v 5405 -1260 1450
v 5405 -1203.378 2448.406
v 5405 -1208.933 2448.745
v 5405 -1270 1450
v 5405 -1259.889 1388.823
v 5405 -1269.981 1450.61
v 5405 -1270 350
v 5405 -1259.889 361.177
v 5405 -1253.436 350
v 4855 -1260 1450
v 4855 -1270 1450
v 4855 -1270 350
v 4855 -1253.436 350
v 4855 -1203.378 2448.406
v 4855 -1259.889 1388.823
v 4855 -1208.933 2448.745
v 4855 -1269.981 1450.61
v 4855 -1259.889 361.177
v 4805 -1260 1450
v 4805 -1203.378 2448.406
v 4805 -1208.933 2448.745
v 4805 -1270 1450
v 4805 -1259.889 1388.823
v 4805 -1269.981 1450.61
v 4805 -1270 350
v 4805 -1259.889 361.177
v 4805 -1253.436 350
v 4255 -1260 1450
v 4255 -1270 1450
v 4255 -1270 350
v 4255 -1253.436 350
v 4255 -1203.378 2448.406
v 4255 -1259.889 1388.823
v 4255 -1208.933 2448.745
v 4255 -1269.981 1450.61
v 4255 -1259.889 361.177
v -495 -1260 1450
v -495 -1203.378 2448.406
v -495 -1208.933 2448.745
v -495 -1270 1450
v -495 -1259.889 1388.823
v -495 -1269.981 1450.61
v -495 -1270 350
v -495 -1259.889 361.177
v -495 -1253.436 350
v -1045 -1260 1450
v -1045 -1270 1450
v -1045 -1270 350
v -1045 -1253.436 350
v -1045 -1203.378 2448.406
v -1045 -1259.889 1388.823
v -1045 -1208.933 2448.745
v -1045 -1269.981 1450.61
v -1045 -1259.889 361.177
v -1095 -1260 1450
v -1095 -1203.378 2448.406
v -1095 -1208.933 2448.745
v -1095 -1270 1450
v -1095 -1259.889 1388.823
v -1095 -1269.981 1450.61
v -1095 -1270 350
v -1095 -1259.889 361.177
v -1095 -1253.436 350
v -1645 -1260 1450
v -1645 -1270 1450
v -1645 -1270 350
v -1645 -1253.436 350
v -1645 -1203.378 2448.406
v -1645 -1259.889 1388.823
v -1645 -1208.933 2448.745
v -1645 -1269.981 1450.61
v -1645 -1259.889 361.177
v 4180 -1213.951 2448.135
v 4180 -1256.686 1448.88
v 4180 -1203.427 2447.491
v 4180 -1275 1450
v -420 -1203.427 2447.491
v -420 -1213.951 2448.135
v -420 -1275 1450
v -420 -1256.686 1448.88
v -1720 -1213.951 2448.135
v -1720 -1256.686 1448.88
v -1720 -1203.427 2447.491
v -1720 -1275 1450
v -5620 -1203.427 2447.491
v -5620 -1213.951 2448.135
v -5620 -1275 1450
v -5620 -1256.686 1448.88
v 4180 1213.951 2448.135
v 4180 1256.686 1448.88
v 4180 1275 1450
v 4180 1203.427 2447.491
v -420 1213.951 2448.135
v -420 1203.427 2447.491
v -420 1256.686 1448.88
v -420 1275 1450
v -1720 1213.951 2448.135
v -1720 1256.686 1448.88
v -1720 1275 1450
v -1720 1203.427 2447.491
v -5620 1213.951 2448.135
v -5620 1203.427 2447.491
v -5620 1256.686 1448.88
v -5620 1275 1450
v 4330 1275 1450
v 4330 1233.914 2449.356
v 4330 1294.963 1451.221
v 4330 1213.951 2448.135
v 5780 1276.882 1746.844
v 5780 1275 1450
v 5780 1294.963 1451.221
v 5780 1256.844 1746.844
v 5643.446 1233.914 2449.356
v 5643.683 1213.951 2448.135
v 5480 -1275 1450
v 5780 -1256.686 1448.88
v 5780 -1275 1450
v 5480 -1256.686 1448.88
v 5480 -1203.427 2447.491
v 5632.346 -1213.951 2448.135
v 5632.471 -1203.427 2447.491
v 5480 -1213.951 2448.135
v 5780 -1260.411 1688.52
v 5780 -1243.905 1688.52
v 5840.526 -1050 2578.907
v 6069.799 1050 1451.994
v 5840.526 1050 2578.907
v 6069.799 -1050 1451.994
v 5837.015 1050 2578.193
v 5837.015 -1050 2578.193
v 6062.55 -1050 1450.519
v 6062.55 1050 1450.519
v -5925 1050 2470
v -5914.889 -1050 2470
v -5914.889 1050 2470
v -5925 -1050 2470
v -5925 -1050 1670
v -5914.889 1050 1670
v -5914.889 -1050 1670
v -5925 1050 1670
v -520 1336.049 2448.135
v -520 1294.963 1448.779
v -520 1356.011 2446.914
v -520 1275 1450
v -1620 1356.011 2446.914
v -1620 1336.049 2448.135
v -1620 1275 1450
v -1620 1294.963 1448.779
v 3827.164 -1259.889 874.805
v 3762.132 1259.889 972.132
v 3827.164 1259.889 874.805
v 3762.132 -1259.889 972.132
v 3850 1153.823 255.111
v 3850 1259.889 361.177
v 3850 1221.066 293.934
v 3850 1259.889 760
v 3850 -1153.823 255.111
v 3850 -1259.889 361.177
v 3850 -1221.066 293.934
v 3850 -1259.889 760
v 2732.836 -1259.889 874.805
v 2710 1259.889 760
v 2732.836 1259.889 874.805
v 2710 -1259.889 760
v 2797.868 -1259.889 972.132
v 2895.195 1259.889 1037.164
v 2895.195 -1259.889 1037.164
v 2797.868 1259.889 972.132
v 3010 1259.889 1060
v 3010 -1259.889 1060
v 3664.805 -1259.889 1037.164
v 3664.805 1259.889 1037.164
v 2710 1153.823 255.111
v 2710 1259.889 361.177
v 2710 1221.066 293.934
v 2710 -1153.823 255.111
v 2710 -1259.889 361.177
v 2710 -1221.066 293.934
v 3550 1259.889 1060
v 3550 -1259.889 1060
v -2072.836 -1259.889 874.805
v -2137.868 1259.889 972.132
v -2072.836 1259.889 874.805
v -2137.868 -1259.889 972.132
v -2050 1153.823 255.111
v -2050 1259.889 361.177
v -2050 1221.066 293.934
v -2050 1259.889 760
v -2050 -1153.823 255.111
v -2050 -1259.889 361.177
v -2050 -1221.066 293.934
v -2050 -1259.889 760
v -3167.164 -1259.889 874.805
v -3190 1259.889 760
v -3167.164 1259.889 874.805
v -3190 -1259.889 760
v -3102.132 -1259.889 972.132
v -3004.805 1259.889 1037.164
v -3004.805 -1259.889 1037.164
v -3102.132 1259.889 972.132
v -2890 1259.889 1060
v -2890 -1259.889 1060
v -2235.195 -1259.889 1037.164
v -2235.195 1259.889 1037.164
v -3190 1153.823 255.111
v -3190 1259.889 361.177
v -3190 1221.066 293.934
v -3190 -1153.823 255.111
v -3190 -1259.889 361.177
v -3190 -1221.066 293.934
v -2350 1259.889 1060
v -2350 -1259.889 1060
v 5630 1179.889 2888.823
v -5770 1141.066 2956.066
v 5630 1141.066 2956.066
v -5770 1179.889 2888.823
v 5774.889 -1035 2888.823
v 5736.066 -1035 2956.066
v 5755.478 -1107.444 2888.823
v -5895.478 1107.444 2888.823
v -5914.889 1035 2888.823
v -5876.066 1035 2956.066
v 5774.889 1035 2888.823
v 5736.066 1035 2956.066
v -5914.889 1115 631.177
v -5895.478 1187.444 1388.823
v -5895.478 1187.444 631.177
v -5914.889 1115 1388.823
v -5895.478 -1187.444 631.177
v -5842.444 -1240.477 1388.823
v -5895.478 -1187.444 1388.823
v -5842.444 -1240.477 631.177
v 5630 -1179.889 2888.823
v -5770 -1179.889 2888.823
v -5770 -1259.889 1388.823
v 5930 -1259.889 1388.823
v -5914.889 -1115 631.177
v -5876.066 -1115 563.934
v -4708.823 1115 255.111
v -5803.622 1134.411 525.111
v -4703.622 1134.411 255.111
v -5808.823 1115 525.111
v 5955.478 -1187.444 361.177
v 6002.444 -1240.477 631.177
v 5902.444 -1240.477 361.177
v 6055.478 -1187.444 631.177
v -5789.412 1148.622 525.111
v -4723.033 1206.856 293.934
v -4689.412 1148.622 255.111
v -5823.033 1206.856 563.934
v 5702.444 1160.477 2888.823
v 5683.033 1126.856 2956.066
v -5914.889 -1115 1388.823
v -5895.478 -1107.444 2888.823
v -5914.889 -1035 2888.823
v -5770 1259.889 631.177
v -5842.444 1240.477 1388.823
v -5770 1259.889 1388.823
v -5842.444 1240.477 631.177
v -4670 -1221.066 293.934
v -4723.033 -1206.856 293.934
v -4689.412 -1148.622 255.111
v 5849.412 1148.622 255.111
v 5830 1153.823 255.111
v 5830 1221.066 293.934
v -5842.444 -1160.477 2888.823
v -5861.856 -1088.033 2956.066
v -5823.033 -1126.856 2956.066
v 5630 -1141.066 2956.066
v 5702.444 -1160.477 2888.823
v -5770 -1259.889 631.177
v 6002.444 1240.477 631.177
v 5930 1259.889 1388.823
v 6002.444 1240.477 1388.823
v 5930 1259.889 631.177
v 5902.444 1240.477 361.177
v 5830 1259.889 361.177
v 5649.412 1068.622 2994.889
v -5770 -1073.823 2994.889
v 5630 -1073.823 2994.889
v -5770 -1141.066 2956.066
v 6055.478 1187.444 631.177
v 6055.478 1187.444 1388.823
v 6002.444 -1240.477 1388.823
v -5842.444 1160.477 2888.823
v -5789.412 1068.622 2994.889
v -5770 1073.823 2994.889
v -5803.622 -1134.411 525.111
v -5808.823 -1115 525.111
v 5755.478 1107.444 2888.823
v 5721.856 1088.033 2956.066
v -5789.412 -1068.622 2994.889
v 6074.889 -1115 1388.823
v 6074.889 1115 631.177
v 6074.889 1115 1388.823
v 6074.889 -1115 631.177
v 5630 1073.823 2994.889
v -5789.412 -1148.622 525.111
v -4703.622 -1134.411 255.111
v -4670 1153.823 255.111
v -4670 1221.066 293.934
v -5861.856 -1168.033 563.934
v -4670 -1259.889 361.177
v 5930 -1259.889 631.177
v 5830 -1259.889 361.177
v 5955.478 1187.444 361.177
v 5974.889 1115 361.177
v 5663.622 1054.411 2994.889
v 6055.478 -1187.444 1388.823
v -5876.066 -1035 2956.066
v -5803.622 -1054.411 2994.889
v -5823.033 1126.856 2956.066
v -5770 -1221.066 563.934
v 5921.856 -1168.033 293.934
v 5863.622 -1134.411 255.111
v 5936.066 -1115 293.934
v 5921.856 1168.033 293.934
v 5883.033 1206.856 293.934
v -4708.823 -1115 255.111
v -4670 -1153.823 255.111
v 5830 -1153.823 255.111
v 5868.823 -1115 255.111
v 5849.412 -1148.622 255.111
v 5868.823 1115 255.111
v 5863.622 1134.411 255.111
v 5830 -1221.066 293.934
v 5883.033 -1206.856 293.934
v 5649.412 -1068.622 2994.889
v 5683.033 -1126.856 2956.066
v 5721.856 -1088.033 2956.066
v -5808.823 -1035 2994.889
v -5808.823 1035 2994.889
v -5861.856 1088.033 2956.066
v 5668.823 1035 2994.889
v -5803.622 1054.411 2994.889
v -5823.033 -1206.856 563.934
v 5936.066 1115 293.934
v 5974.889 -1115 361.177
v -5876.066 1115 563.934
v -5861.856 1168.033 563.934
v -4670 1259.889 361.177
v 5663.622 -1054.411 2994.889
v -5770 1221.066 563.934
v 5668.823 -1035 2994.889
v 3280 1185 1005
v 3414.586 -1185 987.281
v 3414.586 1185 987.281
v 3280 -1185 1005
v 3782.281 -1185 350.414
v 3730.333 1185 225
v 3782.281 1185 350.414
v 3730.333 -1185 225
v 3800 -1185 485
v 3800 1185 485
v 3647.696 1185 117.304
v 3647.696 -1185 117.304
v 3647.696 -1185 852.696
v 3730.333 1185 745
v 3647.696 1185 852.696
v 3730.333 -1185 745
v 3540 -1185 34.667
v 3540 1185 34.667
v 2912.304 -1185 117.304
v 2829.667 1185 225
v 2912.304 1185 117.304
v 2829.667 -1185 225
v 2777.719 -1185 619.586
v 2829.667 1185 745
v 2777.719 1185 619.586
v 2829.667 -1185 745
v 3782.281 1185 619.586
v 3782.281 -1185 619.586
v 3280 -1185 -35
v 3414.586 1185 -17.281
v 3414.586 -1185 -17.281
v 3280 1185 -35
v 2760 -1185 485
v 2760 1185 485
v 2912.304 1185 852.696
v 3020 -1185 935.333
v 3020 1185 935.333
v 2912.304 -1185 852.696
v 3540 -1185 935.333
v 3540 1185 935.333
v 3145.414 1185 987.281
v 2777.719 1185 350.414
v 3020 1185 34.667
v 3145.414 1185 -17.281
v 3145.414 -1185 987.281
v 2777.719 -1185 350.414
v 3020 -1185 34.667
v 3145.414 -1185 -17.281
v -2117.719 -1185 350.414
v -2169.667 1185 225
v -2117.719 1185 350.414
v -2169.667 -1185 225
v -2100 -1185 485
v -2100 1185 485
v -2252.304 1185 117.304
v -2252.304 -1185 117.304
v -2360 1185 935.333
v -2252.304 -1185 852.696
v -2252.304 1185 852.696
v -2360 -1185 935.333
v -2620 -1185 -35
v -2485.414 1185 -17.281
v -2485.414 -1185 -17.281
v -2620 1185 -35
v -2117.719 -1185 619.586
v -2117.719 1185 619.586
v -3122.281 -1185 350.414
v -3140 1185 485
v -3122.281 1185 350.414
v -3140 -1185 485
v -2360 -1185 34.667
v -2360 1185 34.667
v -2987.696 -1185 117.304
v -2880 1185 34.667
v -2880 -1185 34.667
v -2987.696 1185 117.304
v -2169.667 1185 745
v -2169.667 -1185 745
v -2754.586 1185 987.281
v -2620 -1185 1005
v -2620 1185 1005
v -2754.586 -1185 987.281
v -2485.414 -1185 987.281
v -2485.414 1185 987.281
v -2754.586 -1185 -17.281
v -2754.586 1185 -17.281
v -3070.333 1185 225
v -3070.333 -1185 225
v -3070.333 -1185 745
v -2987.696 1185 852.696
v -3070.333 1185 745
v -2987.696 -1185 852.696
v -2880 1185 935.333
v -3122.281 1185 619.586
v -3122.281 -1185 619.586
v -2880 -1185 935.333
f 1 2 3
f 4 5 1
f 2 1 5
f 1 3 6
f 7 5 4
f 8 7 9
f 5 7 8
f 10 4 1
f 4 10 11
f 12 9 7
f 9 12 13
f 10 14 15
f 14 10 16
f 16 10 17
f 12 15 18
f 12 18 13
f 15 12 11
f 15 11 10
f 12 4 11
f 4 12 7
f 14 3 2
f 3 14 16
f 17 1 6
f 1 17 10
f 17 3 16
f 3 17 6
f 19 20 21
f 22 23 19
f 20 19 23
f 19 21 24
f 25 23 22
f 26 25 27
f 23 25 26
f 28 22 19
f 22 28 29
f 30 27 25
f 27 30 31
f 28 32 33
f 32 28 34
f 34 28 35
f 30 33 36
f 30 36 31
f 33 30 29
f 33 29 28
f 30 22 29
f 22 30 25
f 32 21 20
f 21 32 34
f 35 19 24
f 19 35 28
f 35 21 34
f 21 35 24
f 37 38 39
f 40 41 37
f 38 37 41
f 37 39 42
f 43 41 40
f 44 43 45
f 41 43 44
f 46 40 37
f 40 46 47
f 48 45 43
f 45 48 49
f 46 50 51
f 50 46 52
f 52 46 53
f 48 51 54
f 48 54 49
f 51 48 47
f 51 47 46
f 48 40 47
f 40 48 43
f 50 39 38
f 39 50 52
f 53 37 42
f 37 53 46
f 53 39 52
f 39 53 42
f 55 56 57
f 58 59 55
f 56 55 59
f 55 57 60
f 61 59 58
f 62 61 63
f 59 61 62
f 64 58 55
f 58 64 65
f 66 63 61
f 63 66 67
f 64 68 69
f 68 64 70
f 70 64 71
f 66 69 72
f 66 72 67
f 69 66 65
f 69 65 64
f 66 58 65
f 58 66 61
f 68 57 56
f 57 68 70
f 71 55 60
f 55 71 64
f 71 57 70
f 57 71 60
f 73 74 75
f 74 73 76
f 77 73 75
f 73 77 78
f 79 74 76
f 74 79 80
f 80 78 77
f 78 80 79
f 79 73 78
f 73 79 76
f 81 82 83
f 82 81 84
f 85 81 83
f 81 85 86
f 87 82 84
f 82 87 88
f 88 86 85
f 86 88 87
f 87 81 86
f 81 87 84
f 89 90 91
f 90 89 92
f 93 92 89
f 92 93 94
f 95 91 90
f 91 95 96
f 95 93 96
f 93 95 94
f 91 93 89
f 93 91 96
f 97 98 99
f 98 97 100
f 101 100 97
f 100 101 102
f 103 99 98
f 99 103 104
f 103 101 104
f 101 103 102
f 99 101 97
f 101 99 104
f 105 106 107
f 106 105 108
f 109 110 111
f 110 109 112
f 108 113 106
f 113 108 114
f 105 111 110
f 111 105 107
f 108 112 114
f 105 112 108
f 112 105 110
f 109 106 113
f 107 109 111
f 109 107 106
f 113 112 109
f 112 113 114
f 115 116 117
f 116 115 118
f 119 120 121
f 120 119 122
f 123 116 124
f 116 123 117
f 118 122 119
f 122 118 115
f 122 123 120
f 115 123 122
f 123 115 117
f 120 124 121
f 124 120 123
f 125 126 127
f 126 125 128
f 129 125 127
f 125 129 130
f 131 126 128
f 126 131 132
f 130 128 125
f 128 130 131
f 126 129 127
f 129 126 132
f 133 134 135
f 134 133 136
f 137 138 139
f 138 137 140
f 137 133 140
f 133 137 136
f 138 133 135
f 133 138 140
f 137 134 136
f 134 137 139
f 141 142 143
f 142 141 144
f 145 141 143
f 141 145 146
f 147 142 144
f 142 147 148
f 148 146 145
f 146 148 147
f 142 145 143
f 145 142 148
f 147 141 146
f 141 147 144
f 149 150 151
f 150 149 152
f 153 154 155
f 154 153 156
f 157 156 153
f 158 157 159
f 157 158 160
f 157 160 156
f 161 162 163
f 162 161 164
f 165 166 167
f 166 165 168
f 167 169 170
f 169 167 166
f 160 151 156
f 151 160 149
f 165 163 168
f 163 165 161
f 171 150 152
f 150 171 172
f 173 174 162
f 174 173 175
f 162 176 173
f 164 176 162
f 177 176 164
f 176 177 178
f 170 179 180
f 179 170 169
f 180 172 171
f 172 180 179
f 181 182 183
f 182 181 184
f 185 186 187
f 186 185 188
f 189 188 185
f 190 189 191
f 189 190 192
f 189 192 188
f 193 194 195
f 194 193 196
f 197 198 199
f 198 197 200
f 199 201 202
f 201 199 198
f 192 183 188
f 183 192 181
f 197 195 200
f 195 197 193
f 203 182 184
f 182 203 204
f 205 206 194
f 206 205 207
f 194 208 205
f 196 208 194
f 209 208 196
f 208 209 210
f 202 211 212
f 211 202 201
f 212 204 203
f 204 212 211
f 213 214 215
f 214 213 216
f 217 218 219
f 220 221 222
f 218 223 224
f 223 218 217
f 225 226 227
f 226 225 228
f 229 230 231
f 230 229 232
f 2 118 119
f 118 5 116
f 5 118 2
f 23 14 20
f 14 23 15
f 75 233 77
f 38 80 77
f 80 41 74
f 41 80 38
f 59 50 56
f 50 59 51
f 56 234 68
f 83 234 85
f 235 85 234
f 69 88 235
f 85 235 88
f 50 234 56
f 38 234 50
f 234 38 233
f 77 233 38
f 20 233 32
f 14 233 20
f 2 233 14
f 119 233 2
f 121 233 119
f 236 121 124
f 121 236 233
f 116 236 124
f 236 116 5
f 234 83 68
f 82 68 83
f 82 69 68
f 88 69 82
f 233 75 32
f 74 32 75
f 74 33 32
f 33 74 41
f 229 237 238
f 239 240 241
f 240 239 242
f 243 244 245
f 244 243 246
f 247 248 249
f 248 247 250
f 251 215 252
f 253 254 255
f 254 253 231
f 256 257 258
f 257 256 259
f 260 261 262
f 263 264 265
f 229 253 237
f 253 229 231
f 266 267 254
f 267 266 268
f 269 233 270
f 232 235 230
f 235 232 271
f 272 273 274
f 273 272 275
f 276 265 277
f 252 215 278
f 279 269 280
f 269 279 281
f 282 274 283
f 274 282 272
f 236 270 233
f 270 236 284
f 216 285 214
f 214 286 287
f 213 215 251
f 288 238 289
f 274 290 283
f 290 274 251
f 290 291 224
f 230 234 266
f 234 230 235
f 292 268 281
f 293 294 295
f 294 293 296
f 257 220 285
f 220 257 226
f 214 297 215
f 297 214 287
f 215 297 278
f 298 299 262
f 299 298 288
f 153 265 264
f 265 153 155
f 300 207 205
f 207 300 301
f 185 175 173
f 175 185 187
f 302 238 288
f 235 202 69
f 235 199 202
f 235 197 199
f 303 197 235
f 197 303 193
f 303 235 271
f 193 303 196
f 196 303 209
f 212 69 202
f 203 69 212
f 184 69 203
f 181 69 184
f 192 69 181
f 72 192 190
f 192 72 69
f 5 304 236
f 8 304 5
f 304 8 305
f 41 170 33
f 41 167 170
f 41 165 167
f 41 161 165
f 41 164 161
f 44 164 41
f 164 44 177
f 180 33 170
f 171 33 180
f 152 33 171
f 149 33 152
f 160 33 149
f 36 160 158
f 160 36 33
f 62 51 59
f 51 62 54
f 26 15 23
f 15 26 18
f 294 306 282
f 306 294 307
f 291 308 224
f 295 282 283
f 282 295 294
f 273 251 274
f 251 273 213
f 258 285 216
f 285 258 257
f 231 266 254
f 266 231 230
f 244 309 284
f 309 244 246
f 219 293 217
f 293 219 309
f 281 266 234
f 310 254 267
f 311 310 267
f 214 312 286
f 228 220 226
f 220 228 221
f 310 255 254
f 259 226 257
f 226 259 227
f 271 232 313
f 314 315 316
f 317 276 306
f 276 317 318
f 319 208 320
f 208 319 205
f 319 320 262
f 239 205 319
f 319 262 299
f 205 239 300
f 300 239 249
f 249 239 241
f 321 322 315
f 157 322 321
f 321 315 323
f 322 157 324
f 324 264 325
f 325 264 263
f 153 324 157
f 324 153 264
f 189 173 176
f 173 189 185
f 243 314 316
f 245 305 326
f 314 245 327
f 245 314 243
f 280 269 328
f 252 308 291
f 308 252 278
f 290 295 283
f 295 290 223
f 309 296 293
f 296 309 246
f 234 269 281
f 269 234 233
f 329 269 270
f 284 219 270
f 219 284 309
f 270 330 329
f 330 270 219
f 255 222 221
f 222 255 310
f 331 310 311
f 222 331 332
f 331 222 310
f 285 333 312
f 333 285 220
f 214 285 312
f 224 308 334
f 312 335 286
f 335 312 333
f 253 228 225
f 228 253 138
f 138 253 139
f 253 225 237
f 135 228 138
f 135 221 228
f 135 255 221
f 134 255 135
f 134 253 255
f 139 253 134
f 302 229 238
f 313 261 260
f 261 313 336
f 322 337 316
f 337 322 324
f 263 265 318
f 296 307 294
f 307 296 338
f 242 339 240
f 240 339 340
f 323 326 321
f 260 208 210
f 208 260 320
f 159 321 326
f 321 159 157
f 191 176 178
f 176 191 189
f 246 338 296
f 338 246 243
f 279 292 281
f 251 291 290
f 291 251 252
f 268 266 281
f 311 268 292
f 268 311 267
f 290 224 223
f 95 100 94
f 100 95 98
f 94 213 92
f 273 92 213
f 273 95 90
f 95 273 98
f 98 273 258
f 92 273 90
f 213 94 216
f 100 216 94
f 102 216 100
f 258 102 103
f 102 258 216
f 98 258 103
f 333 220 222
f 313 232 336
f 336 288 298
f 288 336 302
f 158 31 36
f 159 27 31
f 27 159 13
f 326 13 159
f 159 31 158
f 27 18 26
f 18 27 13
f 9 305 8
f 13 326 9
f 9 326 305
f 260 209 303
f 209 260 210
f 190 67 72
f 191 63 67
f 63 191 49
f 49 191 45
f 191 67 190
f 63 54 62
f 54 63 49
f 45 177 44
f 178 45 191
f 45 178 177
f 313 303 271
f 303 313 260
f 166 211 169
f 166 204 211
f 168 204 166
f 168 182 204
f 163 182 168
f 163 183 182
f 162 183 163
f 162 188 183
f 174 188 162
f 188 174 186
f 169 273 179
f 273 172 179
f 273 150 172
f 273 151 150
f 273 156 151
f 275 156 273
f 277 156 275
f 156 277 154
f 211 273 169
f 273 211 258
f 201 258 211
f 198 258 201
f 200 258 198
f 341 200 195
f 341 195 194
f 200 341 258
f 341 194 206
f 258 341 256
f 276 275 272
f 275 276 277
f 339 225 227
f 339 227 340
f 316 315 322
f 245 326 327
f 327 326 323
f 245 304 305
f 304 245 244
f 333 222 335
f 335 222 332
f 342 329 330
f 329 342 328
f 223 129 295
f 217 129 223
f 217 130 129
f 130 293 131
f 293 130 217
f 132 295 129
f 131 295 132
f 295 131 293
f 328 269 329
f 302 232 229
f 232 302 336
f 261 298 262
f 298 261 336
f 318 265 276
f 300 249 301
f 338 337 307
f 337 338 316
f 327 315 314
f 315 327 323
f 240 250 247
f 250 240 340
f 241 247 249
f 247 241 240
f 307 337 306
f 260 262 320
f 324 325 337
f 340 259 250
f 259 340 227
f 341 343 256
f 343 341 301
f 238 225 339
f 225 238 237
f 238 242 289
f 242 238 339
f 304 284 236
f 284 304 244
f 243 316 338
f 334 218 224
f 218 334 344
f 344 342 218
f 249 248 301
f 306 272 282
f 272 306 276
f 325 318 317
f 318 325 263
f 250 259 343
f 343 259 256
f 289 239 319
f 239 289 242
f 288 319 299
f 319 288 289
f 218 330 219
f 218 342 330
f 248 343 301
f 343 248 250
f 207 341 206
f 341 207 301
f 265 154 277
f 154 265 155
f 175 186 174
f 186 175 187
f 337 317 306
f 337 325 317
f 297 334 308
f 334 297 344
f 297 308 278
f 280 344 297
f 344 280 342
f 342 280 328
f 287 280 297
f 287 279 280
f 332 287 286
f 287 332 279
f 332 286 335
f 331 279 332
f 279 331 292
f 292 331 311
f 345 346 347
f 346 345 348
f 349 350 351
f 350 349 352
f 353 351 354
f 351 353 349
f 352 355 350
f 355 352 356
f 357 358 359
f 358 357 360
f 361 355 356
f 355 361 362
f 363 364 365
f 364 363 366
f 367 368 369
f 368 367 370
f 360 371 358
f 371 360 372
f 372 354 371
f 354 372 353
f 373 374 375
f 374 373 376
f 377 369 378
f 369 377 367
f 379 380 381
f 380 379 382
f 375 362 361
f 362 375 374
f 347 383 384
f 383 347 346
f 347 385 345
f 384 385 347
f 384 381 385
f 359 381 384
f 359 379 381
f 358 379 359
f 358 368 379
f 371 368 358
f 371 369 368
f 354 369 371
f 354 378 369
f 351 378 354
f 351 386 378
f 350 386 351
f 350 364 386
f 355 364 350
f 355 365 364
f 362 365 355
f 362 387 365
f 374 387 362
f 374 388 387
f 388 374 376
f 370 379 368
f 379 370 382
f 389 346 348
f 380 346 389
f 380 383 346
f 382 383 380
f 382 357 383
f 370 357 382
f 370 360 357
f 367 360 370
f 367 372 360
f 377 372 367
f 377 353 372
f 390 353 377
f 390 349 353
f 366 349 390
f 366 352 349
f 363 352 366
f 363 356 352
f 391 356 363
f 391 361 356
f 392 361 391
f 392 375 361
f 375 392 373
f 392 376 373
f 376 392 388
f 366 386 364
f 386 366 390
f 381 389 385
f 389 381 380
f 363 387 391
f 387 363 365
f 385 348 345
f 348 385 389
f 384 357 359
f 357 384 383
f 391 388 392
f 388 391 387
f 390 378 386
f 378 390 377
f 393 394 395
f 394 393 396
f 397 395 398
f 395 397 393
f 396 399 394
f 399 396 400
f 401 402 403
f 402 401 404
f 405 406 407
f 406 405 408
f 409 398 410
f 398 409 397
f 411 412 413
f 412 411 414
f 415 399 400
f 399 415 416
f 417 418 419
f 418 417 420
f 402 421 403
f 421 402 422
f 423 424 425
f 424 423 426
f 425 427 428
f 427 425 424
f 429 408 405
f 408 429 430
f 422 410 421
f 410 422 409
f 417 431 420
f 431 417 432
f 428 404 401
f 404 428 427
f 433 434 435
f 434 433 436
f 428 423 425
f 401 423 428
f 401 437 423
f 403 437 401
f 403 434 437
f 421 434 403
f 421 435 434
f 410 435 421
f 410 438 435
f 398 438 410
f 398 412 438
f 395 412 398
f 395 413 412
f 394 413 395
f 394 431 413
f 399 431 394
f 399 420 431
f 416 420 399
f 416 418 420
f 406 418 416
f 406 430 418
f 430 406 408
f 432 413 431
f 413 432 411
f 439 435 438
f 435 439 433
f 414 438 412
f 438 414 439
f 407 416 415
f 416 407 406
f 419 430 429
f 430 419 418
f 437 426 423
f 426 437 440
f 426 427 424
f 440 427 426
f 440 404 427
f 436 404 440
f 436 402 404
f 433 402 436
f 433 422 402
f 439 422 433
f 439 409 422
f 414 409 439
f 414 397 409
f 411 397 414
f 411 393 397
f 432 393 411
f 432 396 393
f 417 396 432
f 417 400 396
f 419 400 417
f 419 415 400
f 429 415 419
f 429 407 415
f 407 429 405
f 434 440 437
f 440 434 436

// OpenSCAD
// Protected crossing design
// Copyright 2018 Pierre ROUZEAU AKA PRZ
// Program license GPL v3
// documentation licence cc BY-SA 4.0 and GFDL 1.2
include <../Z_library.scad>

part=0;

//Front wheel x position
xfrontw= 3280;
//Bus length
length = 12000;
//Bus width
width = 2530;
//Main bus height
busht=3000;
//Wheel base
wheelbase = 5900;
//Front cantilever
frontcant = 2800; 
//Height of median line
midht = 1350;
//ground clearance
groundclear = 250;

if (part==1)
	bus();
else if (part==2)
	glass();
else if (part==3)
	tires();
else {
	color(glass_color) glass();
	red() bus();
	black() tires();
}

glass_color = [128,128,128,180]/256;

//Back cantilever - unused
backcant = length-wheelbase-frontcant;

*t(0,1380,-30) 
						scale(1595) 
							import("Bus_by_Anderson_Rondon.stl");

module bus () {
	sphd = 300;
	sphr = sphd/2;
	diff() {
		hull() {
			// bus bottom
			duplx(-length+1500) 
				bcyl(xfrontw+frontcant-sphr-100,sphr+groundclear);
			duplx(-length+sphd) 
				bcyl(xfrontw+frontcant-sphr,sphr+520);
			duplx(-length+sphd) 
				bcyl(xfrontw+frontcant-sphr,midht);
			duplx(-length+sphd+300) 
				bcyl(xfrontw+frontcant-sphr-300,busht-sphr,80);
		}
		//:::  Remove wheel place
		duplx (-wheelbase)
		  hull()
				t(xfrontw,0,500) 
					dmirrorx() dmirrorz()
						cyly (-600,3000, 270,0,260, 16);
  }
	module bcyl(x,z, mw=0) {
	  wdx = width/2-sphr;
		dmirrory()
			t(x,wdx-mw,z)
				sphere(sphr, $fn=12);
	}	
}	
//size control
//blue() cyly (-300,2550, 0,0,1500);
//blue() cylx (300,12020, -5920,0,1300);

module glass (){
	//front glass
	t(xfrontw+frontcant-20,0,1450)
	  r(0,-11.5)
			cubez(20,2100,1150);	
	//back glass
	t(xfrontw+frontcant-length+5,0,1670)
		cubez(20,2100,800);
	//door glasses
	duplx (-wheelbase)
	t(xfrontw+frontcant-950,-width/2+5,350)
		duplx(-600) {
			cubez(550,20,1100);
			tslz (1100)
			  r(-3.5)
			    cubez(550,20,1000);
		}	
	//side glasses	
	dmirrory() {
		t(xfrontw+frontcant-1900,-width/2-10,1450)
					r(-3.5)
						cubex(-wheelbase+1300,20,1000,0,10,500);	
		t(xfrontw+frontcant-1900-wheelbase,-width/2-10,1450)
			r(-3.5)
				cubex(-length+wheelbase+2200,20,1000,0,10,500);	
	}	
	//driver glass
	t(xfrontw+frontcant-1750,width/2+10,1450)
	  diff() {        
		  r(3.5)
				cubex(1450,20,1000,0,10,500);	
			r(0,-11)
				cubex(400,400,1600, 1480,10,500);
		}	
	//side front glass
	t(xfrontw+frontcant-1350+750,-width/2-10,1450)
	  diff() {        
		  r(-3.5)
				cubex(300,20,1000,0,10,500);	
			r(0,-11)
				cubex(800,400,1600, 340,10,500);
		}	
	//middle glass, driver side
		t(xfrontw+frontcant-1900-wheelbase,width/2+10,1450)
			r(-3.5)
				cubex(1100,20,1000,100,10,500);	
} 

module tires() {
	tirede = 1040;
	duplx(-wheelbase) 
	  cyly (-tirede,2370, xfrontw,0,tirede/2-35, 24);
}
